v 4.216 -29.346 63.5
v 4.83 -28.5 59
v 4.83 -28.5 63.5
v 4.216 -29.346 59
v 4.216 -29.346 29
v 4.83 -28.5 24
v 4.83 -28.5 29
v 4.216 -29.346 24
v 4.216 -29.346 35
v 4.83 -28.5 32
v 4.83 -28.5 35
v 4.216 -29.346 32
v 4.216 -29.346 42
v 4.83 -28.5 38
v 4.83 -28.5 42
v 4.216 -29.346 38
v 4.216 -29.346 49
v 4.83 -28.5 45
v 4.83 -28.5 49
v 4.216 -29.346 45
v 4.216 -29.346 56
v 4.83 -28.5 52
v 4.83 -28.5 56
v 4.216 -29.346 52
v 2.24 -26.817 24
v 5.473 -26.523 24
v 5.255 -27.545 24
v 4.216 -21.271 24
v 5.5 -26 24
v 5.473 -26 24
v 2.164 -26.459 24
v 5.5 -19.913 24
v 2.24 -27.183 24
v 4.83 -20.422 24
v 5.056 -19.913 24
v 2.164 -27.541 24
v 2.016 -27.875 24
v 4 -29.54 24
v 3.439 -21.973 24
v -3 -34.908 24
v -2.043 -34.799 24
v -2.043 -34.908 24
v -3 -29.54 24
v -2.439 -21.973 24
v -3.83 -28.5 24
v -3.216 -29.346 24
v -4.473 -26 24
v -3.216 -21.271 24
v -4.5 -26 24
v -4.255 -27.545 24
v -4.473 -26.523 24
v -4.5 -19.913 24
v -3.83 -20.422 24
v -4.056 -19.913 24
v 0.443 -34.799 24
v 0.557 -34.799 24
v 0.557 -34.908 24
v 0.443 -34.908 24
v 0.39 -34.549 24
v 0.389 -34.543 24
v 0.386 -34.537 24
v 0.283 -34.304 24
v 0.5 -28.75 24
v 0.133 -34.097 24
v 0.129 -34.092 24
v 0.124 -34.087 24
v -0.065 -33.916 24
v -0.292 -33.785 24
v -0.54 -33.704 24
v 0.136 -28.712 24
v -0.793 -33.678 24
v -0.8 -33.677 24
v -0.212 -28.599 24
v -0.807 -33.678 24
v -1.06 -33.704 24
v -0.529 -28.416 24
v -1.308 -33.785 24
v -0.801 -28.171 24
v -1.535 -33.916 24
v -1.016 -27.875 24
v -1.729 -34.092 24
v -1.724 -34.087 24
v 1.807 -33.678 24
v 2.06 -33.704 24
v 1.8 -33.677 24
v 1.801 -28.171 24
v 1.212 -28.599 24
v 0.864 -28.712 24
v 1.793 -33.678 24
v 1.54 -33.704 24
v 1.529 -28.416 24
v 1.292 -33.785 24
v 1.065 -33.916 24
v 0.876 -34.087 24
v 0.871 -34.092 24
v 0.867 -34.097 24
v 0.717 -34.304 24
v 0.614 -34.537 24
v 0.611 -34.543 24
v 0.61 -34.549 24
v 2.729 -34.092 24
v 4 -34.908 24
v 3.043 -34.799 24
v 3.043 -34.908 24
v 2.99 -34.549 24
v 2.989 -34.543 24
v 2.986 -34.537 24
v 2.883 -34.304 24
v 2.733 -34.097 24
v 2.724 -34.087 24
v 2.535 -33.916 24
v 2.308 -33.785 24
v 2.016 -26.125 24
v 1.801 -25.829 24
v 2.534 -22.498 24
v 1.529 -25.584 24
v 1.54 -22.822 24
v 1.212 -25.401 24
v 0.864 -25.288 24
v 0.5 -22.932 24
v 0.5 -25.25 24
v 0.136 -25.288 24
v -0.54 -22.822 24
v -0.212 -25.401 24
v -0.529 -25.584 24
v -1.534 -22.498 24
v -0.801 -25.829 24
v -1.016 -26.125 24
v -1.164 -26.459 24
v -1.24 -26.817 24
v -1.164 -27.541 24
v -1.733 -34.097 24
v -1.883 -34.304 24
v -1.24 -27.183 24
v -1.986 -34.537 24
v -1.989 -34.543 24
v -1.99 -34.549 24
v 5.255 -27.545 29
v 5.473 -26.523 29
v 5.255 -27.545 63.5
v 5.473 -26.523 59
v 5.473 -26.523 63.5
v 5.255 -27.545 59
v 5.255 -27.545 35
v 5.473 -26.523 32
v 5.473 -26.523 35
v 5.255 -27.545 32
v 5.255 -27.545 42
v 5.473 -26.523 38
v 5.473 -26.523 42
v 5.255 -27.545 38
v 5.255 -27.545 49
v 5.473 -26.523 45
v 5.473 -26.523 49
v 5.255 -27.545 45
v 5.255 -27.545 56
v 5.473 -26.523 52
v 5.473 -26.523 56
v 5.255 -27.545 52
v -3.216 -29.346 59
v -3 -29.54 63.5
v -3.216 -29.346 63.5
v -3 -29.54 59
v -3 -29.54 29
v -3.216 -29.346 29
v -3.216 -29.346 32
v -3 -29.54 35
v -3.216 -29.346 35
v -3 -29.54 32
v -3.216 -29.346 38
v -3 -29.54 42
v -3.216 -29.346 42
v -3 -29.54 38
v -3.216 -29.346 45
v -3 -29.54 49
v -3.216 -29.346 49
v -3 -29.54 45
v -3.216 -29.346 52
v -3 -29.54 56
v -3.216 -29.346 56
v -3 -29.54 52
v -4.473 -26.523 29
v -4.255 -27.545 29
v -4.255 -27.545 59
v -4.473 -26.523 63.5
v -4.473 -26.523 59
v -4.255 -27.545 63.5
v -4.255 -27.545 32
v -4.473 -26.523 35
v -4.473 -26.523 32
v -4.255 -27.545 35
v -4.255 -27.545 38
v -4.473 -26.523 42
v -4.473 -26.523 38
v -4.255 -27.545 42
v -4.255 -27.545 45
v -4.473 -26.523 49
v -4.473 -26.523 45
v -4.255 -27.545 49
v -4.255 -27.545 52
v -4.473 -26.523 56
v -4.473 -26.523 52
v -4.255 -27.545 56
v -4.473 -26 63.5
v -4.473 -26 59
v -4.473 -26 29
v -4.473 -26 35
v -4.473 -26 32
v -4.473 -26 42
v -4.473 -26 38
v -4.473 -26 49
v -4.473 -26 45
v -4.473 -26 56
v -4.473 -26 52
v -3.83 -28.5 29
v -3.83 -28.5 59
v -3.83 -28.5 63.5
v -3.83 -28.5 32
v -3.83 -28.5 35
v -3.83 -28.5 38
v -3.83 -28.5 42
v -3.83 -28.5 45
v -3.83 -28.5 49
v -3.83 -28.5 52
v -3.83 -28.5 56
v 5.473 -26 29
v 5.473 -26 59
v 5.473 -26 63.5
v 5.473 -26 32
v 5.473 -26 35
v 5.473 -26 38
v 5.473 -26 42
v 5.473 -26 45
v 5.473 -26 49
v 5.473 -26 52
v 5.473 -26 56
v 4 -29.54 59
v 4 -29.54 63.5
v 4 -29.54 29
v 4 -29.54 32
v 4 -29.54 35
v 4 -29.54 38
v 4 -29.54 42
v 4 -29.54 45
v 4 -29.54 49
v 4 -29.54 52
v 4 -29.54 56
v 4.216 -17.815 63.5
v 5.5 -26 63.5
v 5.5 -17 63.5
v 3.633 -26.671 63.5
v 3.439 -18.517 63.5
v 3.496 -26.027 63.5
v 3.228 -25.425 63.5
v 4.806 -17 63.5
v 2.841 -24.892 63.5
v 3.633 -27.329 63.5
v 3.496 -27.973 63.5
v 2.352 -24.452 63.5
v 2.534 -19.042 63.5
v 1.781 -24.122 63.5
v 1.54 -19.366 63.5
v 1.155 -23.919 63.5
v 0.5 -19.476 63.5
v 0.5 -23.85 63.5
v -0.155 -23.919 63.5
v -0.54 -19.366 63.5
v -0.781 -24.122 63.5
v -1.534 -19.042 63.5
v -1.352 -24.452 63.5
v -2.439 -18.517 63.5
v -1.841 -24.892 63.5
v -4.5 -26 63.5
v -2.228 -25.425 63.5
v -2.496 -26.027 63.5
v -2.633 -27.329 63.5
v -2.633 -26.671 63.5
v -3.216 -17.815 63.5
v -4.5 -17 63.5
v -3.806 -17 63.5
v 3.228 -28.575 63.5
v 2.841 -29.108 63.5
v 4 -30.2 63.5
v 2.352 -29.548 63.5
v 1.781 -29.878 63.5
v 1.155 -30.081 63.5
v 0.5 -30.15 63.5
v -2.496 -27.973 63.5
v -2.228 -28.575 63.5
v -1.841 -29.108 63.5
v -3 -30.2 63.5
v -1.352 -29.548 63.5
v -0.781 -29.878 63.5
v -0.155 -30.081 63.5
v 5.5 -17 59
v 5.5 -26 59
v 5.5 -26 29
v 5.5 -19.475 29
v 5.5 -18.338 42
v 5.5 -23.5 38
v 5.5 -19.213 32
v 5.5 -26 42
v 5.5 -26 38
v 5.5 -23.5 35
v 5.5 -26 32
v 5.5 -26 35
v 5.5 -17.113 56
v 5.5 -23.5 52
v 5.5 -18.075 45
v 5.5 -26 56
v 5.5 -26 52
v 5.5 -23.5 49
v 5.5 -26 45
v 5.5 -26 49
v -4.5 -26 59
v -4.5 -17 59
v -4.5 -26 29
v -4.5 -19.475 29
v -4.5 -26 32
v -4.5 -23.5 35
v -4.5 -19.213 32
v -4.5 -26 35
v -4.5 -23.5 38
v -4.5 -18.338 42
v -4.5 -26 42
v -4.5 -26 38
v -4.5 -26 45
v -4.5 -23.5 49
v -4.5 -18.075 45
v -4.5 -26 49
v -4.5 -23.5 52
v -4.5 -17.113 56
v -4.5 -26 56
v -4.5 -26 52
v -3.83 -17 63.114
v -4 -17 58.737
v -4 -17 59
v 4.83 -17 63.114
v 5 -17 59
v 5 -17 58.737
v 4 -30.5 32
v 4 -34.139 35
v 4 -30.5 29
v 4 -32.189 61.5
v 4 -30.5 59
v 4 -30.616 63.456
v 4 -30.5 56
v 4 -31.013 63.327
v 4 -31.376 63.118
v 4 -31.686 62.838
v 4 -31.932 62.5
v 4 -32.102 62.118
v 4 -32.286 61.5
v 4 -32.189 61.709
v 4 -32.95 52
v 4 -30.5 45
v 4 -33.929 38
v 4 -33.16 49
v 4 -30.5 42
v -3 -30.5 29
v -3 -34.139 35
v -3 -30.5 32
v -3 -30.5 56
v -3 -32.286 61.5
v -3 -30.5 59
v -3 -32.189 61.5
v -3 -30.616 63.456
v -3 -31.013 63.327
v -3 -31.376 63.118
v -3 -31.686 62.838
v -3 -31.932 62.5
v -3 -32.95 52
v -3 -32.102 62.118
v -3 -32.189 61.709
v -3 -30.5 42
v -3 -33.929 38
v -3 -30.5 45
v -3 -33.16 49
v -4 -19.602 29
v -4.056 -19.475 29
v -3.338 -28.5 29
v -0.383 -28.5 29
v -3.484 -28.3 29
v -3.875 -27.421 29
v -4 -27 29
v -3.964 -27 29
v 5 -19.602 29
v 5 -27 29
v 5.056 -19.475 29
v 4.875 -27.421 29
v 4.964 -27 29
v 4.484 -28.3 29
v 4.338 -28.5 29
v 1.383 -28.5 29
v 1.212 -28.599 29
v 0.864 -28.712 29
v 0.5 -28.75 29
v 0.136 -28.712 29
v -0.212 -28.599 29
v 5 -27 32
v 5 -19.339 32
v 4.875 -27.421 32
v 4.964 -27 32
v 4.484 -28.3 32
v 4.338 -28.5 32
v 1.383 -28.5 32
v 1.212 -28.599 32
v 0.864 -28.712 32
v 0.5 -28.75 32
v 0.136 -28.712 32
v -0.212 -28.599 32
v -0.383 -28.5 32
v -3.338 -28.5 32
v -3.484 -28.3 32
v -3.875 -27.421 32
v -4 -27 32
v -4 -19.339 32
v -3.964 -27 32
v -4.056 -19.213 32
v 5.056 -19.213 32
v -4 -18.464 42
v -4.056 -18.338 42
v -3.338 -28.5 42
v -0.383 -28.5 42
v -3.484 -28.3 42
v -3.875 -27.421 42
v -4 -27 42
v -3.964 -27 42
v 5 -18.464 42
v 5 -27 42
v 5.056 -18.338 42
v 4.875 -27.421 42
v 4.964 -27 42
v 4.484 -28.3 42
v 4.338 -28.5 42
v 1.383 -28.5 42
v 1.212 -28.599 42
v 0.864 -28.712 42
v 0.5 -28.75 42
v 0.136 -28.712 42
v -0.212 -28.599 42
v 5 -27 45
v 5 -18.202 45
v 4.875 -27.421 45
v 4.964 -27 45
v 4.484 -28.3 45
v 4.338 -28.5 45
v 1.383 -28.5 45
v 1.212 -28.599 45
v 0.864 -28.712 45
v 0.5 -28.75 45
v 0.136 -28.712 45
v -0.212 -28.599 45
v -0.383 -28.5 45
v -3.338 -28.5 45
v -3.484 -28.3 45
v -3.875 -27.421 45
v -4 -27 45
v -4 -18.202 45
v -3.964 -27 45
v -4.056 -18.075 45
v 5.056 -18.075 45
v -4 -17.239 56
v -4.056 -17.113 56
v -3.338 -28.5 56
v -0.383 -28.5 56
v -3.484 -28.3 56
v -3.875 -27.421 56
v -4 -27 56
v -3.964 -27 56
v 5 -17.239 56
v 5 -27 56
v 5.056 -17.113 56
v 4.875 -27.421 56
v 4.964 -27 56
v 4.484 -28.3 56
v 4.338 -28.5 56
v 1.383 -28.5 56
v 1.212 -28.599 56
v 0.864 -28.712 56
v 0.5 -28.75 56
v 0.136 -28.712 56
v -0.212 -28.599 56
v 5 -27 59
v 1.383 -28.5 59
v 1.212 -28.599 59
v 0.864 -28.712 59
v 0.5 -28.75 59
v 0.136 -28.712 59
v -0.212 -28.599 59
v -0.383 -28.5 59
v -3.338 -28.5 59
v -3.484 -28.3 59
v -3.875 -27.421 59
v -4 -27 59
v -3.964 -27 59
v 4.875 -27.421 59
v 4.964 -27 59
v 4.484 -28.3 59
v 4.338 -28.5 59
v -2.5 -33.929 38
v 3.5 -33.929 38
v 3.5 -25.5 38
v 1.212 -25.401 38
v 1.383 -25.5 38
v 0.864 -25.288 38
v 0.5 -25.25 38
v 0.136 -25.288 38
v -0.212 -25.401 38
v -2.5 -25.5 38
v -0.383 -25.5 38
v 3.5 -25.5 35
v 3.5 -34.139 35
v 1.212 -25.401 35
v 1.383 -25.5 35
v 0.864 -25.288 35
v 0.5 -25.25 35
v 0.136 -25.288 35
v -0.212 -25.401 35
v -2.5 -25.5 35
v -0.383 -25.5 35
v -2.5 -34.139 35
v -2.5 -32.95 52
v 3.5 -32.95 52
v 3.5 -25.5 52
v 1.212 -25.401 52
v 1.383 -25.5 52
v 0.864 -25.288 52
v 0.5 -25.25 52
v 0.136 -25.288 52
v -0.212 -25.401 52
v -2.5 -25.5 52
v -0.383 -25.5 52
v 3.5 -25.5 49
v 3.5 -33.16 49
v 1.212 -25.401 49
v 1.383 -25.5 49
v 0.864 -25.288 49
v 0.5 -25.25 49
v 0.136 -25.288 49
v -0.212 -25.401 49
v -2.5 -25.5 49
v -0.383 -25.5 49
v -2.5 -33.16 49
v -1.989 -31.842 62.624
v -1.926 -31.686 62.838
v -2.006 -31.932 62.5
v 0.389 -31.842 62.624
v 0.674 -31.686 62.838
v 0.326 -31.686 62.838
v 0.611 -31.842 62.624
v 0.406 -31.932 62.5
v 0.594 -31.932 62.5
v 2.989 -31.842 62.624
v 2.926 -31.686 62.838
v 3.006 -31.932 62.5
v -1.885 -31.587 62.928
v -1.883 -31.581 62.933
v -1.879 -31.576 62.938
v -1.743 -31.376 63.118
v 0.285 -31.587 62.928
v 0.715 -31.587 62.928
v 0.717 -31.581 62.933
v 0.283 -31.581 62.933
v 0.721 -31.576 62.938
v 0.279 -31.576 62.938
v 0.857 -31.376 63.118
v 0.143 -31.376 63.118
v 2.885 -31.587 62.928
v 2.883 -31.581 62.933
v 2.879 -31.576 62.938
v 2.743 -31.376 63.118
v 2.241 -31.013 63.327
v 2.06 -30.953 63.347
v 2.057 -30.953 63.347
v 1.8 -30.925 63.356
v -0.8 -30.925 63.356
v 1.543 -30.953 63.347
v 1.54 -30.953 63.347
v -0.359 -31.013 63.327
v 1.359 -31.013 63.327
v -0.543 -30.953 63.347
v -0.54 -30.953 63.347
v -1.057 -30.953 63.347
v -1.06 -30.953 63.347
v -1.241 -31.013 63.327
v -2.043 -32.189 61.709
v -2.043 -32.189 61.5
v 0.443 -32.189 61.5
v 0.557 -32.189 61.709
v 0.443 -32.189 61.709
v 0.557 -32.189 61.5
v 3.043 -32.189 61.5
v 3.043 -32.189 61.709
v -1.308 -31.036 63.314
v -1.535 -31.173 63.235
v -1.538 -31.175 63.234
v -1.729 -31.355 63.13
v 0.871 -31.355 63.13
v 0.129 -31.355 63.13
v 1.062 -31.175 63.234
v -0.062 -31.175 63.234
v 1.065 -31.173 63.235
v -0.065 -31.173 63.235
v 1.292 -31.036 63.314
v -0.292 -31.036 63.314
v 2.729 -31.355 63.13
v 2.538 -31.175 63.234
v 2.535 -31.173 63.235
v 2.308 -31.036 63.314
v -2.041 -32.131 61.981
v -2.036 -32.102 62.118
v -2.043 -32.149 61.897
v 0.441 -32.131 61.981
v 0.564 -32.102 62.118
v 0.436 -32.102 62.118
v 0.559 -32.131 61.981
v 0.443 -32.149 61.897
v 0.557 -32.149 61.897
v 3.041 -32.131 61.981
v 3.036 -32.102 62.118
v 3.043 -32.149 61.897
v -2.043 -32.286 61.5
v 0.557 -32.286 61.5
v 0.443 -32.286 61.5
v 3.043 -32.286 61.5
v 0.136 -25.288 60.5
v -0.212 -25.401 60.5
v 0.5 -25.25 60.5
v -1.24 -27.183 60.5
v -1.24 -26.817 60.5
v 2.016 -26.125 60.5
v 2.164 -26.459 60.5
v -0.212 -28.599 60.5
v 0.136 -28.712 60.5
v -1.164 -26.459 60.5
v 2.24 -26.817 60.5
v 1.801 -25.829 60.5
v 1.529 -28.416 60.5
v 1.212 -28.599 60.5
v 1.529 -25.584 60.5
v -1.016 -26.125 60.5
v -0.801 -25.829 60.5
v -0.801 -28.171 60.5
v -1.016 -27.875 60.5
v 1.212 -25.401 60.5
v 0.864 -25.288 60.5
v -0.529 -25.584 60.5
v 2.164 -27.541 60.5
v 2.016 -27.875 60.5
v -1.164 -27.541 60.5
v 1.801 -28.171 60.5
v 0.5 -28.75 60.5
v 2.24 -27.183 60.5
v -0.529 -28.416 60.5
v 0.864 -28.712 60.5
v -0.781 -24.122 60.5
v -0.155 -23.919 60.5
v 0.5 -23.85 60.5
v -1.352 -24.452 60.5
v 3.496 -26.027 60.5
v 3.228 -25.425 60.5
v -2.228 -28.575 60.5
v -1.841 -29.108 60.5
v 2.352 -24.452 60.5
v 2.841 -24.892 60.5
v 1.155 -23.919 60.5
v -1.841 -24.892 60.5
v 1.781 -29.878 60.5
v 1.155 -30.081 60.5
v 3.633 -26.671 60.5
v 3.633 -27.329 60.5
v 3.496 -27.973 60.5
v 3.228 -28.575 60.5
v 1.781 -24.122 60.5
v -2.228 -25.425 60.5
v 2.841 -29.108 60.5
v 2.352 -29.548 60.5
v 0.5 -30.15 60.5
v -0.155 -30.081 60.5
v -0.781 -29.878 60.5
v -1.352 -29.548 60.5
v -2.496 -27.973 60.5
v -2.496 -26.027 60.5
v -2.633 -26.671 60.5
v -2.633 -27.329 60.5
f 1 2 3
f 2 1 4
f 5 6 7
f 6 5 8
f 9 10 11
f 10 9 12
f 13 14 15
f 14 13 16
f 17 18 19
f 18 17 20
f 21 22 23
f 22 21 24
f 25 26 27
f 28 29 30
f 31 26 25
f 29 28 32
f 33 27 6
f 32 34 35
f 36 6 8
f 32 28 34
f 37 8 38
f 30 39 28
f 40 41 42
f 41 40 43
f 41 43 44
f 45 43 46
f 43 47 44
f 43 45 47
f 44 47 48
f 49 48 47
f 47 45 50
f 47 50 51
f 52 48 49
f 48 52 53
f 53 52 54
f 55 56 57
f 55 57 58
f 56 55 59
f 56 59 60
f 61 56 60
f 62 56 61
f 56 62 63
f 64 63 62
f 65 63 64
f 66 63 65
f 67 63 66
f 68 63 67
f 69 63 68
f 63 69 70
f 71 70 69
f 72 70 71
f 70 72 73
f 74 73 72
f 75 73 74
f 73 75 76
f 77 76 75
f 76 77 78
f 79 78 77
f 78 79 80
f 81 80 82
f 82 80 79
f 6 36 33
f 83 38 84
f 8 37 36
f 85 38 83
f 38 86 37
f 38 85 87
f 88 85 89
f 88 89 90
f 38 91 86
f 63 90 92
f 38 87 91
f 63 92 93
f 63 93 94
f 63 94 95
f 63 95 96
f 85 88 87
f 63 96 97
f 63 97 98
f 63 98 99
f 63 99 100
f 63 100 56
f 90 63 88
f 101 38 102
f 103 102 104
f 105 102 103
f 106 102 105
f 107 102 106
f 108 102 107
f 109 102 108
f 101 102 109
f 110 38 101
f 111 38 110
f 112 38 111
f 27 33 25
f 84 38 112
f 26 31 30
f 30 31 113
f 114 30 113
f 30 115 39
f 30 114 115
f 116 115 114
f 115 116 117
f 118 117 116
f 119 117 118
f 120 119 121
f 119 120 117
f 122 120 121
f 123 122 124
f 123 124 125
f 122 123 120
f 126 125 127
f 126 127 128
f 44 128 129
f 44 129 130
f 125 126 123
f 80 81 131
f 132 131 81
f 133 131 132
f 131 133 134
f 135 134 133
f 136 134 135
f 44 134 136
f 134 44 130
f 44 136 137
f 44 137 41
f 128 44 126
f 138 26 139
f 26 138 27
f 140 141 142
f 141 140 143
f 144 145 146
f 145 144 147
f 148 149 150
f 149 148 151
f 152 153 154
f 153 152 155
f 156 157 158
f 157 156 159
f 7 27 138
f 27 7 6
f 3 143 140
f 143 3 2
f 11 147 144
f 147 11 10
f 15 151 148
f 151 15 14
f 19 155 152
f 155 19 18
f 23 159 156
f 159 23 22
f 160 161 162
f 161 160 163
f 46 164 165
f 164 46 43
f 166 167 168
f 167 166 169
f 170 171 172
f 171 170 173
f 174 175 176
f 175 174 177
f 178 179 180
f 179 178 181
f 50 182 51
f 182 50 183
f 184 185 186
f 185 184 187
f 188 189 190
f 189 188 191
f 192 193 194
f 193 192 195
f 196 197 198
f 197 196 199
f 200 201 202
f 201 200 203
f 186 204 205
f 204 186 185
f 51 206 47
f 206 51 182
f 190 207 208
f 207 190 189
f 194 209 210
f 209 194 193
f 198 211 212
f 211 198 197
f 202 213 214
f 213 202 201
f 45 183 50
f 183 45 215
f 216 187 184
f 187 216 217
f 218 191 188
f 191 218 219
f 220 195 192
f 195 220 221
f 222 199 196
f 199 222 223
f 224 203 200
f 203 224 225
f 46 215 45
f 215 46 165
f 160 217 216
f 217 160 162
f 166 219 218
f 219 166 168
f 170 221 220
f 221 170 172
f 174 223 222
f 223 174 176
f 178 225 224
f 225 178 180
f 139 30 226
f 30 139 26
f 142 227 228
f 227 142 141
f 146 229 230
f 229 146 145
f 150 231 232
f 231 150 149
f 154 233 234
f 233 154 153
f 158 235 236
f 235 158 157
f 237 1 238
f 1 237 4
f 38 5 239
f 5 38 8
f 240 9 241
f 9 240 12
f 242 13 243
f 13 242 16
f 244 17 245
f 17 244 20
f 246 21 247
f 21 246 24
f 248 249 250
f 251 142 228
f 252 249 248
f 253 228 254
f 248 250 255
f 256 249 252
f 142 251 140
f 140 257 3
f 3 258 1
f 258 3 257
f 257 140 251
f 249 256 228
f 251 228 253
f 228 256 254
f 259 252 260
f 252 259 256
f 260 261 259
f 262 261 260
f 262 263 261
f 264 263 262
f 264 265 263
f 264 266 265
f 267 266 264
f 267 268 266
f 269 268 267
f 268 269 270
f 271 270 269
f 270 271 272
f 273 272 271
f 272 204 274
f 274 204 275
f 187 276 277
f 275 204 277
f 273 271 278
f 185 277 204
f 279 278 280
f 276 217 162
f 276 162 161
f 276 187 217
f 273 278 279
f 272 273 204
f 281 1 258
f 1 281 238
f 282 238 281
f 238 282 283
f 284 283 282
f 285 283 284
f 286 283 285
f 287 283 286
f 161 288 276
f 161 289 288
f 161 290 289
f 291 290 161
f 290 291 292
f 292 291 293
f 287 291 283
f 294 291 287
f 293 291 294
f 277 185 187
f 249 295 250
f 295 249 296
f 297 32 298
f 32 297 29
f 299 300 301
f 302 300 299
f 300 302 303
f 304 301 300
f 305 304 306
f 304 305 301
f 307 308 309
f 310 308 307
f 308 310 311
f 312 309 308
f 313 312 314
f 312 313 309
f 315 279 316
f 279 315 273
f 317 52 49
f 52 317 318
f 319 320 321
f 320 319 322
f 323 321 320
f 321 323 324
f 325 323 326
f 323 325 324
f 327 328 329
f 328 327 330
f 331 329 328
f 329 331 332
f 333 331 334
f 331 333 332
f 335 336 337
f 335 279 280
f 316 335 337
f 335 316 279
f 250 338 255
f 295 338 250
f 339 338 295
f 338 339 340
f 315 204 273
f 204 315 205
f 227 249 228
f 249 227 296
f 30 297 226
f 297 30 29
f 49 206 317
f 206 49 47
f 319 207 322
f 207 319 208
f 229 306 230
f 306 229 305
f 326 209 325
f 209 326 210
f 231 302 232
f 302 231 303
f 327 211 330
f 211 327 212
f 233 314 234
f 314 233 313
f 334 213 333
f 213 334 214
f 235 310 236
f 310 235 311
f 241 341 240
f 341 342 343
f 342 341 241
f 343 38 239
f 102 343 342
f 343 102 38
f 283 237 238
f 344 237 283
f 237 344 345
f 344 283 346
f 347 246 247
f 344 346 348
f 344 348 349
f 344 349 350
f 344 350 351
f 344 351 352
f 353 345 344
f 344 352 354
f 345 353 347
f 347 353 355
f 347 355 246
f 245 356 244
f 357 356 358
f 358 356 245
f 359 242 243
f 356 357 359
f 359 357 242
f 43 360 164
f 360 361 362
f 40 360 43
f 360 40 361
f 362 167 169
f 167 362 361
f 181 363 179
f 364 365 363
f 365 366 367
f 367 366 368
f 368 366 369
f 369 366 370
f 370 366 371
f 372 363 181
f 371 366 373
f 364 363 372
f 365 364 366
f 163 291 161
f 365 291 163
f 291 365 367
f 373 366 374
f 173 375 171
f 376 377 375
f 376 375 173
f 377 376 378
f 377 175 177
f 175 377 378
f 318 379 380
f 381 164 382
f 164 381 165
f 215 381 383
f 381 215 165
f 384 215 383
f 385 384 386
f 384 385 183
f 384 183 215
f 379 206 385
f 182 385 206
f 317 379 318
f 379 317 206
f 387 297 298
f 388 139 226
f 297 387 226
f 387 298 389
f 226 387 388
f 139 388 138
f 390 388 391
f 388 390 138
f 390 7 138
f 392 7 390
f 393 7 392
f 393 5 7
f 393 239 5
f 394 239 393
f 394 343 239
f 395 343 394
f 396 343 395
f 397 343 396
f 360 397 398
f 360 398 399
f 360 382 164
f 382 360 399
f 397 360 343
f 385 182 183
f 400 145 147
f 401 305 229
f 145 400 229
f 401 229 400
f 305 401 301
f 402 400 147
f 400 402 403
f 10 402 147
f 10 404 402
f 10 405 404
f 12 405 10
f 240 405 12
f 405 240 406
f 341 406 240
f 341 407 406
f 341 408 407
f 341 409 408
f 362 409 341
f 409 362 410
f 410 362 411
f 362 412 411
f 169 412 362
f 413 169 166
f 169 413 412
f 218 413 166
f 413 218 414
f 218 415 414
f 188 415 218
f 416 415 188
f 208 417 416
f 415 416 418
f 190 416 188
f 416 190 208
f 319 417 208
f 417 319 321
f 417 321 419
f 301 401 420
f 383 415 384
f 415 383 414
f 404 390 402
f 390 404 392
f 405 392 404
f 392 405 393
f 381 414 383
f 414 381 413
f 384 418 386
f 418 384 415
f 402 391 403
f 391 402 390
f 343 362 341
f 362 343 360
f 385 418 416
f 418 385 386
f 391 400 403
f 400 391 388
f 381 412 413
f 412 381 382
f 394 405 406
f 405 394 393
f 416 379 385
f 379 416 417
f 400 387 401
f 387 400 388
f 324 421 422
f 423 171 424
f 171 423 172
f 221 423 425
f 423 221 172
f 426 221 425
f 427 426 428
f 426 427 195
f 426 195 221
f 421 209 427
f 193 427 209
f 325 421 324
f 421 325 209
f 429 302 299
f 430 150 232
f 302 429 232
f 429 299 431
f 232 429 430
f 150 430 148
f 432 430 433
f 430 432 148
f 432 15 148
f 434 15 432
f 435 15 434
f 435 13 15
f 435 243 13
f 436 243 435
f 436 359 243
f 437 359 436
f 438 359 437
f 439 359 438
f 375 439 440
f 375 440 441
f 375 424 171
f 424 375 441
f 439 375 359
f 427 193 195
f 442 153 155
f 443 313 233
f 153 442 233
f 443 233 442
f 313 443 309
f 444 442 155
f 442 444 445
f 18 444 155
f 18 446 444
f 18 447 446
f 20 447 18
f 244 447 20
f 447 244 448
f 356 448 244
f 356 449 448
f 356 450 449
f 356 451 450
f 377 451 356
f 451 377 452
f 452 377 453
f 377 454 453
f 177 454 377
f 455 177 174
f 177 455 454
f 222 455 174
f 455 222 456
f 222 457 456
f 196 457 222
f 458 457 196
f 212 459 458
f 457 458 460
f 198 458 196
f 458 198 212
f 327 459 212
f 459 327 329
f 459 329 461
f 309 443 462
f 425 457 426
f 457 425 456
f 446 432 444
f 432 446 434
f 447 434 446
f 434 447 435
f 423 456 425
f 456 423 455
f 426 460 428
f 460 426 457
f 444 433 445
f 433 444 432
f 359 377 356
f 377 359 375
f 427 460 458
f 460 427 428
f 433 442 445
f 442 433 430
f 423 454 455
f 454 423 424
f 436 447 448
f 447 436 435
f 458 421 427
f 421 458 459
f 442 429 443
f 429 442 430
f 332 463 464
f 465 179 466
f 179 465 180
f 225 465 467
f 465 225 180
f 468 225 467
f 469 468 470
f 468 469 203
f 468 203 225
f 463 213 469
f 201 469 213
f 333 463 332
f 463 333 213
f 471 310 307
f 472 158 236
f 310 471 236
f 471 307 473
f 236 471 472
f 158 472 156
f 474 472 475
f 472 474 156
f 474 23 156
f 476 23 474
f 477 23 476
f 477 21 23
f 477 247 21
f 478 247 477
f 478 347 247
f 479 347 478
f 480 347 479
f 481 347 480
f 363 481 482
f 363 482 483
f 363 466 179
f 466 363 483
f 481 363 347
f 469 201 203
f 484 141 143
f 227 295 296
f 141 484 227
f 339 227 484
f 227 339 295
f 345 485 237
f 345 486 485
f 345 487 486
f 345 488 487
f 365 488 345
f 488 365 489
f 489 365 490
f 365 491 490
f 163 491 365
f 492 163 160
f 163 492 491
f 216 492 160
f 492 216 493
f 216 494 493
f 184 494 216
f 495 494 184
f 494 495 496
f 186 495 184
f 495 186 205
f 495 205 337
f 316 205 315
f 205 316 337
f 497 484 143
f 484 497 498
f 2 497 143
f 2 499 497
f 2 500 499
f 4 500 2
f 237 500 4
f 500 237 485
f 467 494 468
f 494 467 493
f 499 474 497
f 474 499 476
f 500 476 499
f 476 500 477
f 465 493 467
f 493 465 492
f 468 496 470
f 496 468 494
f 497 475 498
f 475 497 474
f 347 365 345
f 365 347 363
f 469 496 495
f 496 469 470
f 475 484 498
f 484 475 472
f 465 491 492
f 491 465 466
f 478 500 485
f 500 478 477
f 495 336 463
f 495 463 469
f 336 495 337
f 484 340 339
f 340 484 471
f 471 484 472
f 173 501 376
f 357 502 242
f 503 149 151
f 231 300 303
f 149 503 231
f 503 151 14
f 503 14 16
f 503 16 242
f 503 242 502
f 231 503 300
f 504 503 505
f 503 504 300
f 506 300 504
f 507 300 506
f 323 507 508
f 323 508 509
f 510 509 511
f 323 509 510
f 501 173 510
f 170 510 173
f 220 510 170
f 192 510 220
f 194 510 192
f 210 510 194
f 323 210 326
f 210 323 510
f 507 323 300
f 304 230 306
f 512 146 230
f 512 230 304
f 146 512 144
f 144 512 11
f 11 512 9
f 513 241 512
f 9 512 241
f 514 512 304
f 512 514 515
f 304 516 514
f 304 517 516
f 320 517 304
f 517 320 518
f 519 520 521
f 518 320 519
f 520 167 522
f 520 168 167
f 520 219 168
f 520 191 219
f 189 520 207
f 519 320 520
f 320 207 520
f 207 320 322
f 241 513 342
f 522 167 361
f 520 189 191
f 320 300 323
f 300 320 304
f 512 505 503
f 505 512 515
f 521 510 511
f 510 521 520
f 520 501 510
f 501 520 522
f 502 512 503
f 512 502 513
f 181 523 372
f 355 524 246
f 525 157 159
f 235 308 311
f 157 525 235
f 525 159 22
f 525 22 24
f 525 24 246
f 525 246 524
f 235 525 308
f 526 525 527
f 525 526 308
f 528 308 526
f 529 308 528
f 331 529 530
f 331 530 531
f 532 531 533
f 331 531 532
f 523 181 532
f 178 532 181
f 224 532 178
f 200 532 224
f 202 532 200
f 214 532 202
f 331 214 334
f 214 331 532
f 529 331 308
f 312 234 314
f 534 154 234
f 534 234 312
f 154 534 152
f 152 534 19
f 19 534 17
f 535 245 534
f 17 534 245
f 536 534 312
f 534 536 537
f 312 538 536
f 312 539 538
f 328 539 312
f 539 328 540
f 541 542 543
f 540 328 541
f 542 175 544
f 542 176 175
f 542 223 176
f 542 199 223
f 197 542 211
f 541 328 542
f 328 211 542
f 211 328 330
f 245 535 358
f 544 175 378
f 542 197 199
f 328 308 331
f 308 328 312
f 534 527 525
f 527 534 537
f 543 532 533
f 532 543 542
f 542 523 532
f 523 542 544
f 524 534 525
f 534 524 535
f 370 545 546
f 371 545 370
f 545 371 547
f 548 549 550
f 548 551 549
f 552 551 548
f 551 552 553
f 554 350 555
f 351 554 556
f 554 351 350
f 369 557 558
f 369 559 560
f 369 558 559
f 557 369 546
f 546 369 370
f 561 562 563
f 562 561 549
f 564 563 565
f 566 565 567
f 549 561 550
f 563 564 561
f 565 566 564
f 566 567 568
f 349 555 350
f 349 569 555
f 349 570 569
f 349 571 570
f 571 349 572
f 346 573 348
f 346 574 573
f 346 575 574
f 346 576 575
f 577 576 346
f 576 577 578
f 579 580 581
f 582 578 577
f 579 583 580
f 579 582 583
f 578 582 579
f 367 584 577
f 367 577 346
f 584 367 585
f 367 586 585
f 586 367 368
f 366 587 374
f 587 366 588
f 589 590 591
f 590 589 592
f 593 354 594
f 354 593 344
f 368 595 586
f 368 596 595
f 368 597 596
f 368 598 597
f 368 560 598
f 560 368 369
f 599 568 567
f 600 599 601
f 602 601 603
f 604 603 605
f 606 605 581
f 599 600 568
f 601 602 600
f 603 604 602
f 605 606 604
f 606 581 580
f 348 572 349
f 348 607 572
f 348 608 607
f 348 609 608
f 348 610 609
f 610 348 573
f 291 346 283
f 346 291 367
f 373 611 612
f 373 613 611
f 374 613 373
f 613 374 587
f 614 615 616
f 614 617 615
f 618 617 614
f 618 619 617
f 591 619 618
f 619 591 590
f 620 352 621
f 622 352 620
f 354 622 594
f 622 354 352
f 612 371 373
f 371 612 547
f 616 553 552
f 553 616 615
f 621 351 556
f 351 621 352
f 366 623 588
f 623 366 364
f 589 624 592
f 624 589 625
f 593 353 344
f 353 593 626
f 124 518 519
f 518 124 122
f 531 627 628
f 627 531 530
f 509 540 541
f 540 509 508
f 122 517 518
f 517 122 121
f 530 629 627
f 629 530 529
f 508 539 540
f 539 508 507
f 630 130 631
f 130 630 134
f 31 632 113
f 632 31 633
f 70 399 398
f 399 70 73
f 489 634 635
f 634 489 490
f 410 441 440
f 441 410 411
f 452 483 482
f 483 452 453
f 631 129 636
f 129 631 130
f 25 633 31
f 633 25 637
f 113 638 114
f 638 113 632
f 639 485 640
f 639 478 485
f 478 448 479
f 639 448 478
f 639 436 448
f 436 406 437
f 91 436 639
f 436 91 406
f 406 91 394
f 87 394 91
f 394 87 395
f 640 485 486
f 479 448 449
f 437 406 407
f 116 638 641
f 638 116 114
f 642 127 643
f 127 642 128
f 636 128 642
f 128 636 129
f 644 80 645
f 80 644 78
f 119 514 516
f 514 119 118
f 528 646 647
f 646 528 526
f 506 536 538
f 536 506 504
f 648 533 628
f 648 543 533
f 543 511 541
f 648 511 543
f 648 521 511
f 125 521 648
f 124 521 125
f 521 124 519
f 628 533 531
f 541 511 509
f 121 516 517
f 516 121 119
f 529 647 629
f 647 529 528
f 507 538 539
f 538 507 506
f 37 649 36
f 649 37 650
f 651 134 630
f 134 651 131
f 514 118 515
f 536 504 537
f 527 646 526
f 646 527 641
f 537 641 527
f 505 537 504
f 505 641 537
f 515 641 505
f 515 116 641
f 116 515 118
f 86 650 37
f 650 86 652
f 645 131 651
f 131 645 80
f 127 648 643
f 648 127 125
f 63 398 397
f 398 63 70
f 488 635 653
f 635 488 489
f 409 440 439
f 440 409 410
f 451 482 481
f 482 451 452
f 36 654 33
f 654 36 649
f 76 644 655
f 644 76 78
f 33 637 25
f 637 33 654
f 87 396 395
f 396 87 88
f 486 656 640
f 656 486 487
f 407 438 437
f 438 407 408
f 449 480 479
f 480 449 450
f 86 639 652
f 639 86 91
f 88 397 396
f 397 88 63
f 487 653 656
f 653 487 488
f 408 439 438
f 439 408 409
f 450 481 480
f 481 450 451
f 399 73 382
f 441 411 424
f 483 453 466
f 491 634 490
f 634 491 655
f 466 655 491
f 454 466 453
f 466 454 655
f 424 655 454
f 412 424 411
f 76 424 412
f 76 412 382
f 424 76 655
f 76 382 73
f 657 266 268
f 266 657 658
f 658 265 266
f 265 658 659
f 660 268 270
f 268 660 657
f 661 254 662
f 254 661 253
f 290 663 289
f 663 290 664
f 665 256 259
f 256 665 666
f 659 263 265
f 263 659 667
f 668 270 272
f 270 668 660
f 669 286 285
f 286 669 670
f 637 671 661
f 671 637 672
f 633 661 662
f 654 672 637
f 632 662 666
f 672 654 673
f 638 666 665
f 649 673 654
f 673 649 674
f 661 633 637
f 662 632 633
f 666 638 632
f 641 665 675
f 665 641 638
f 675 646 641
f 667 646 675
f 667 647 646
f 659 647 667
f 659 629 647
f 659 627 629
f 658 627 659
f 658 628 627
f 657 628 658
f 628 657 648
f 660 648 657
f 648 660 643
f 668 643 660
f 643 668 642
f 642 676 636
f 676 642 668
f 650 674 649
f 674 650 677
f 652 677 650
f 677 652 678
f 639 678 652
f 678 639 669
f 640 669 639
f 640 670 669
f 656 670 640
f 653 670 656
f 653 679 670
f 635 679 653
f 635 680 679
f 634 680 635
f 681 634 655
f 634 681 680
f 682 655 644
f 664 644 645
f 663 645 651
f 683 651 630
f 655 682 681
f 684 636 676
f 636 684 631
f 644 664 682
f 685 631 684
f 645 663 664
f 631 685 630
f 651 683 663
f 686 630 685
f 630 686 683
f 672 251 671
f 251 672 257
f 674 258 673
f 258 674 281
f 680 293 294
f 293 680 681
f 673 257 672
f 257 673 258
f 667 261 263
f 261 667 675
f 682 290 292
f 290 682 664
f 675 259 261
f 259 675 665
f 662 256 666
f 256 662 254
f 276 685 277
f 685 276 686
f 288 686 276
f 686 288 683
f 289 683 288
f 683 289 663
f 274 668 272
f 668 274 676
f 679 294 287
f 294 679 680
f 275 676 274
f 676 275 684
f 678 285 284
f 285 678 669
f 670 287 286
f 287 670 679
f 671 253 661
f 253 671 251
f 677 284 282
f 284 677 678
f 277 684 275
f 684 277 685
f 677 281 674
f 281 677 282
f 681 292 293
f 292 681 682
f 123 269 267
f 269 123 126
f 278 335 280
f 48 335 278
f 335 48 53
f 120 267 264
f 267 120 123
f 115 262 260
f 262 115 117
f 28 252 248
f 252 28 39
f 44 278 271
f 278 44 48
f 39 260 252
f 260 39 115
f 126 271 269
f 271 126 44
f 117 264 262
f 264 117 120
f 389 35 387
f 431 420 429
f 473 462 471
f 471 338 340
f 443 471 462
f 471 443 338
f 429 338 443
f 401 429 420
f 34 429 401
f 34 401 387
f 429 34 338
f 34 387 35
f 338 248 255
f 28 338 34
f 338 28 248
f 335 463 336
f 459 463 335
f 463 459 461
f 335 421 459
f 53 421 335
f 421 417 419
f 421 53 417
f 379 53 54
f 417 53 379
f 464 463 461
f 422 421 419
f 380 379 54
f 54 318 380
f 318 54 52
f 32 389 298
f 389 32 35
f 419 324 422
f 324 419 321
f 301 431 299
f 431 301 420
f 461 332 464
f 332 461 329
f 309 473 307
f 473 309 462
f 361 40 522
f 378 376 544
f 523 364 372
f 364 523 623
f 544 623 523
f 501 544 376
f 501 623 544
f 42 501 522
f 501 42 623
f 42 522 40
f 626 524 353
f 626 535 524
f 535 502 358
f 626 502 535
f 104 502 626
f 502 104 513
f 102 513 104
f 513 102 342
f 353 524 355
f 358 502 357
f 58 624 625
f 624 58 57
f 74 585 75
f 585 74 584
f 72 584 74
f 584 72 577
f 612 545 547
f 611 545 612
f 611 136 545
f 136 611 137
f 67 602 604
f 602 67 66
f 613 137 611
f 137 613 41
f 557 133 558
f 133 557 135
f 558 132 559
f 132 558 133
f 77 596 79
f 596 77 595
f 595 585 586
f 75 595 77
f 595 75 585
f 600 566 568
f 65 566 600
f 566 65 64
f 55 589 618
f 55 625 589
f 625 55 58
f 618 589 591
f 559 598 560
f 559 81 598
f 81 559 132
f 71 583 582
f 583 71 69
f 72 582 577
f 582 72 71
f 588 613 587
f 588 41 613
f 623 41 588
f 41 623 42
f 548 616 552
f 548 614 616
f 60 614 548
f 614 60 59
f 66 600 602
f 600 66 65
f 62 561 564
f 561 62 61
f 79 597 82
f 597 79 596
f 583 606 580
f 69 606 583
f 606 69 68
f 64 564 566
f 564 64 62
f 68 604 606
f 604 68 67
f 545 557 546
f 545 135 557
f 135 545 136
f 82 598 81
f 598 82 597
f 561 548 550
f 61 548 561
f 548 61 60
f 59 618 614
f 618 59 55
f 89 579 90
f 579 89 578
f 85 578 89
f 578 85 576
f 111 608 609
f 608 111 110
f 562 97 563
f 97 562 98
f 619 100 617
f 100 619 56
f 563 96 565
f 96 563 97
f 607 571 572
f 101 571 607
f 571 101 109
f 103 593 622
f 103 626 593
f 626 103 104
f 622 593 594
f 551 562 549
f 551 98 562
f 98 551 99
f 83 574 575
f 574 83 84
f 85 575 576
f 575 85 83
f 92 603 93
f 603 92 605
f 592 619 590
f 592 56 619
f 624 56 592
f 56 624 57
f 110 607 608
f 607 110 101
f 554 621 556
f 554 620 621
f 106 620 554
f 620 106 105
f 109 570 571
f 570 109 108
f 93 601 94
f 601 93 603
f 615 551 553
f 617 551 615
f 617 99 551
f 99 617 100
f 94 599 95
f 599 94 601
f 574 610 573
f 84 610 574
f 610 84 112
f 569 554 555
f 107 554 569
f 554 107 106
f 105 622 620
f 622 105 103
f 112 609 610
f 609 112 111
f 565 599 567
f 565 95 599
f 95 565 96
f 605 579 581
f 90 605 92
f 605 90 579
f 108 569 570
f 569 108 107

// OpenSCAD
// PRUSA iteration4
// cable holder
// GNU GPL v3
// Josef Průša <iam@josefprusa.cz> and contributors
// http://www.reprap.org/wiki/Prusa_Mendel
// http://prusamendel.org

module zip_main(){
    // Ziptie cut for upper cables.
    translate([-10,-30.5,24]) cube([20,2,3]);
    translate([-6,-30.5,24]) cube([2,20,3]);
    translate([5,-30.5,24]) cube([2,20,3]);
    
    difference(){
      translate([0.5,-26,24]) rotate([0,0,90]) cylinder(h=3,r=6,$fn=30 );
      translate([0.5,-26,23]) rotate([0,0,90]) cylinder(h=5,r=4.6,$fn=30 );
      translate([-10,-35.5,23]) cube([20,5,5]);
      translate([-10,-27,23]) cube([20,10,5]);
    }
}

module zip_ext_cables(){
    // Ziptie cut for lower cables.
    translate([-10,-25.5,24]) cube([20,2,3]);
    translate([-4.5,-45.5,24]) cube([2,20,3]);
    translate([3.5,-45.5,24]) cube([2,20,3]);
}

module cable_holder(){
    difference(){
      union(){
        // Base block.
        translate([0.5,-26,24]) rotate([0,0,90]) cylinder(h=39.5,r=5,$fn=30);
        translate([-4.5,-26,24]) cube([10,9,39.5]);
        translate([-3,-35,24]) cube([7,10,39.5]);
      }

      // Screw.
      translate([0.5,-27,19.5]) rotate([0,0,90]) cylinder(h=42,r=1.75,$fn=30);
      translate([0.5,-27,19.5+41]) rotate([0,0,90]) cylinder(h=5,r=3.15,$fn=30);

      // Upper cables cut.
      translate([0.5,-18,23]) rotate([0,5,90]) cylinder(h=41,r=5,$fn=30);
      translate([-10,-20,23]) rotate([-5,0,0]) cube([20,9,45]);

      // Lower angled cut.
      translate([-10,-44,23]) rotate([-4,0,0]) cube([20,9,45]);

      // Wires
      translate([-0.8,-35,23]) rotate([0,4,90]) cylinder(h=41,r=1.25,$fn=30 );
      translate([1.8,-35,23]) rotate([0,4,90]) cylinder(h=41,r=1.25,$fn=30 );

      // Ziptie openings.
      translate([0,0,5]) zip_main();
      translate([0,0,18]) zip_main();
      translate([0,0,32]) zip_main();
      translate([0,0,11]) zip_ext_cables();
      translate([0,0,25]) zip_ext_cables();

      // Round edge cut.
      translate([0,1.8,-1.5]) difference(){
        translate([-10,-32,63]) rotate([0,90,0]) cylinder(h=41,r=4,$fn=30 );
        translate([-10,-32,63]) rotate([0,90,0]) cylinder(h=41,r=2,$fn=30 );
        translate([-10,-36,53]) rotate([0,0,0]) cube([20,9,10]);
        translate([-10,-32,58]) rotate([0,0,0]) cube([20,9,10]);
      }
    }
}

cable_holder();
